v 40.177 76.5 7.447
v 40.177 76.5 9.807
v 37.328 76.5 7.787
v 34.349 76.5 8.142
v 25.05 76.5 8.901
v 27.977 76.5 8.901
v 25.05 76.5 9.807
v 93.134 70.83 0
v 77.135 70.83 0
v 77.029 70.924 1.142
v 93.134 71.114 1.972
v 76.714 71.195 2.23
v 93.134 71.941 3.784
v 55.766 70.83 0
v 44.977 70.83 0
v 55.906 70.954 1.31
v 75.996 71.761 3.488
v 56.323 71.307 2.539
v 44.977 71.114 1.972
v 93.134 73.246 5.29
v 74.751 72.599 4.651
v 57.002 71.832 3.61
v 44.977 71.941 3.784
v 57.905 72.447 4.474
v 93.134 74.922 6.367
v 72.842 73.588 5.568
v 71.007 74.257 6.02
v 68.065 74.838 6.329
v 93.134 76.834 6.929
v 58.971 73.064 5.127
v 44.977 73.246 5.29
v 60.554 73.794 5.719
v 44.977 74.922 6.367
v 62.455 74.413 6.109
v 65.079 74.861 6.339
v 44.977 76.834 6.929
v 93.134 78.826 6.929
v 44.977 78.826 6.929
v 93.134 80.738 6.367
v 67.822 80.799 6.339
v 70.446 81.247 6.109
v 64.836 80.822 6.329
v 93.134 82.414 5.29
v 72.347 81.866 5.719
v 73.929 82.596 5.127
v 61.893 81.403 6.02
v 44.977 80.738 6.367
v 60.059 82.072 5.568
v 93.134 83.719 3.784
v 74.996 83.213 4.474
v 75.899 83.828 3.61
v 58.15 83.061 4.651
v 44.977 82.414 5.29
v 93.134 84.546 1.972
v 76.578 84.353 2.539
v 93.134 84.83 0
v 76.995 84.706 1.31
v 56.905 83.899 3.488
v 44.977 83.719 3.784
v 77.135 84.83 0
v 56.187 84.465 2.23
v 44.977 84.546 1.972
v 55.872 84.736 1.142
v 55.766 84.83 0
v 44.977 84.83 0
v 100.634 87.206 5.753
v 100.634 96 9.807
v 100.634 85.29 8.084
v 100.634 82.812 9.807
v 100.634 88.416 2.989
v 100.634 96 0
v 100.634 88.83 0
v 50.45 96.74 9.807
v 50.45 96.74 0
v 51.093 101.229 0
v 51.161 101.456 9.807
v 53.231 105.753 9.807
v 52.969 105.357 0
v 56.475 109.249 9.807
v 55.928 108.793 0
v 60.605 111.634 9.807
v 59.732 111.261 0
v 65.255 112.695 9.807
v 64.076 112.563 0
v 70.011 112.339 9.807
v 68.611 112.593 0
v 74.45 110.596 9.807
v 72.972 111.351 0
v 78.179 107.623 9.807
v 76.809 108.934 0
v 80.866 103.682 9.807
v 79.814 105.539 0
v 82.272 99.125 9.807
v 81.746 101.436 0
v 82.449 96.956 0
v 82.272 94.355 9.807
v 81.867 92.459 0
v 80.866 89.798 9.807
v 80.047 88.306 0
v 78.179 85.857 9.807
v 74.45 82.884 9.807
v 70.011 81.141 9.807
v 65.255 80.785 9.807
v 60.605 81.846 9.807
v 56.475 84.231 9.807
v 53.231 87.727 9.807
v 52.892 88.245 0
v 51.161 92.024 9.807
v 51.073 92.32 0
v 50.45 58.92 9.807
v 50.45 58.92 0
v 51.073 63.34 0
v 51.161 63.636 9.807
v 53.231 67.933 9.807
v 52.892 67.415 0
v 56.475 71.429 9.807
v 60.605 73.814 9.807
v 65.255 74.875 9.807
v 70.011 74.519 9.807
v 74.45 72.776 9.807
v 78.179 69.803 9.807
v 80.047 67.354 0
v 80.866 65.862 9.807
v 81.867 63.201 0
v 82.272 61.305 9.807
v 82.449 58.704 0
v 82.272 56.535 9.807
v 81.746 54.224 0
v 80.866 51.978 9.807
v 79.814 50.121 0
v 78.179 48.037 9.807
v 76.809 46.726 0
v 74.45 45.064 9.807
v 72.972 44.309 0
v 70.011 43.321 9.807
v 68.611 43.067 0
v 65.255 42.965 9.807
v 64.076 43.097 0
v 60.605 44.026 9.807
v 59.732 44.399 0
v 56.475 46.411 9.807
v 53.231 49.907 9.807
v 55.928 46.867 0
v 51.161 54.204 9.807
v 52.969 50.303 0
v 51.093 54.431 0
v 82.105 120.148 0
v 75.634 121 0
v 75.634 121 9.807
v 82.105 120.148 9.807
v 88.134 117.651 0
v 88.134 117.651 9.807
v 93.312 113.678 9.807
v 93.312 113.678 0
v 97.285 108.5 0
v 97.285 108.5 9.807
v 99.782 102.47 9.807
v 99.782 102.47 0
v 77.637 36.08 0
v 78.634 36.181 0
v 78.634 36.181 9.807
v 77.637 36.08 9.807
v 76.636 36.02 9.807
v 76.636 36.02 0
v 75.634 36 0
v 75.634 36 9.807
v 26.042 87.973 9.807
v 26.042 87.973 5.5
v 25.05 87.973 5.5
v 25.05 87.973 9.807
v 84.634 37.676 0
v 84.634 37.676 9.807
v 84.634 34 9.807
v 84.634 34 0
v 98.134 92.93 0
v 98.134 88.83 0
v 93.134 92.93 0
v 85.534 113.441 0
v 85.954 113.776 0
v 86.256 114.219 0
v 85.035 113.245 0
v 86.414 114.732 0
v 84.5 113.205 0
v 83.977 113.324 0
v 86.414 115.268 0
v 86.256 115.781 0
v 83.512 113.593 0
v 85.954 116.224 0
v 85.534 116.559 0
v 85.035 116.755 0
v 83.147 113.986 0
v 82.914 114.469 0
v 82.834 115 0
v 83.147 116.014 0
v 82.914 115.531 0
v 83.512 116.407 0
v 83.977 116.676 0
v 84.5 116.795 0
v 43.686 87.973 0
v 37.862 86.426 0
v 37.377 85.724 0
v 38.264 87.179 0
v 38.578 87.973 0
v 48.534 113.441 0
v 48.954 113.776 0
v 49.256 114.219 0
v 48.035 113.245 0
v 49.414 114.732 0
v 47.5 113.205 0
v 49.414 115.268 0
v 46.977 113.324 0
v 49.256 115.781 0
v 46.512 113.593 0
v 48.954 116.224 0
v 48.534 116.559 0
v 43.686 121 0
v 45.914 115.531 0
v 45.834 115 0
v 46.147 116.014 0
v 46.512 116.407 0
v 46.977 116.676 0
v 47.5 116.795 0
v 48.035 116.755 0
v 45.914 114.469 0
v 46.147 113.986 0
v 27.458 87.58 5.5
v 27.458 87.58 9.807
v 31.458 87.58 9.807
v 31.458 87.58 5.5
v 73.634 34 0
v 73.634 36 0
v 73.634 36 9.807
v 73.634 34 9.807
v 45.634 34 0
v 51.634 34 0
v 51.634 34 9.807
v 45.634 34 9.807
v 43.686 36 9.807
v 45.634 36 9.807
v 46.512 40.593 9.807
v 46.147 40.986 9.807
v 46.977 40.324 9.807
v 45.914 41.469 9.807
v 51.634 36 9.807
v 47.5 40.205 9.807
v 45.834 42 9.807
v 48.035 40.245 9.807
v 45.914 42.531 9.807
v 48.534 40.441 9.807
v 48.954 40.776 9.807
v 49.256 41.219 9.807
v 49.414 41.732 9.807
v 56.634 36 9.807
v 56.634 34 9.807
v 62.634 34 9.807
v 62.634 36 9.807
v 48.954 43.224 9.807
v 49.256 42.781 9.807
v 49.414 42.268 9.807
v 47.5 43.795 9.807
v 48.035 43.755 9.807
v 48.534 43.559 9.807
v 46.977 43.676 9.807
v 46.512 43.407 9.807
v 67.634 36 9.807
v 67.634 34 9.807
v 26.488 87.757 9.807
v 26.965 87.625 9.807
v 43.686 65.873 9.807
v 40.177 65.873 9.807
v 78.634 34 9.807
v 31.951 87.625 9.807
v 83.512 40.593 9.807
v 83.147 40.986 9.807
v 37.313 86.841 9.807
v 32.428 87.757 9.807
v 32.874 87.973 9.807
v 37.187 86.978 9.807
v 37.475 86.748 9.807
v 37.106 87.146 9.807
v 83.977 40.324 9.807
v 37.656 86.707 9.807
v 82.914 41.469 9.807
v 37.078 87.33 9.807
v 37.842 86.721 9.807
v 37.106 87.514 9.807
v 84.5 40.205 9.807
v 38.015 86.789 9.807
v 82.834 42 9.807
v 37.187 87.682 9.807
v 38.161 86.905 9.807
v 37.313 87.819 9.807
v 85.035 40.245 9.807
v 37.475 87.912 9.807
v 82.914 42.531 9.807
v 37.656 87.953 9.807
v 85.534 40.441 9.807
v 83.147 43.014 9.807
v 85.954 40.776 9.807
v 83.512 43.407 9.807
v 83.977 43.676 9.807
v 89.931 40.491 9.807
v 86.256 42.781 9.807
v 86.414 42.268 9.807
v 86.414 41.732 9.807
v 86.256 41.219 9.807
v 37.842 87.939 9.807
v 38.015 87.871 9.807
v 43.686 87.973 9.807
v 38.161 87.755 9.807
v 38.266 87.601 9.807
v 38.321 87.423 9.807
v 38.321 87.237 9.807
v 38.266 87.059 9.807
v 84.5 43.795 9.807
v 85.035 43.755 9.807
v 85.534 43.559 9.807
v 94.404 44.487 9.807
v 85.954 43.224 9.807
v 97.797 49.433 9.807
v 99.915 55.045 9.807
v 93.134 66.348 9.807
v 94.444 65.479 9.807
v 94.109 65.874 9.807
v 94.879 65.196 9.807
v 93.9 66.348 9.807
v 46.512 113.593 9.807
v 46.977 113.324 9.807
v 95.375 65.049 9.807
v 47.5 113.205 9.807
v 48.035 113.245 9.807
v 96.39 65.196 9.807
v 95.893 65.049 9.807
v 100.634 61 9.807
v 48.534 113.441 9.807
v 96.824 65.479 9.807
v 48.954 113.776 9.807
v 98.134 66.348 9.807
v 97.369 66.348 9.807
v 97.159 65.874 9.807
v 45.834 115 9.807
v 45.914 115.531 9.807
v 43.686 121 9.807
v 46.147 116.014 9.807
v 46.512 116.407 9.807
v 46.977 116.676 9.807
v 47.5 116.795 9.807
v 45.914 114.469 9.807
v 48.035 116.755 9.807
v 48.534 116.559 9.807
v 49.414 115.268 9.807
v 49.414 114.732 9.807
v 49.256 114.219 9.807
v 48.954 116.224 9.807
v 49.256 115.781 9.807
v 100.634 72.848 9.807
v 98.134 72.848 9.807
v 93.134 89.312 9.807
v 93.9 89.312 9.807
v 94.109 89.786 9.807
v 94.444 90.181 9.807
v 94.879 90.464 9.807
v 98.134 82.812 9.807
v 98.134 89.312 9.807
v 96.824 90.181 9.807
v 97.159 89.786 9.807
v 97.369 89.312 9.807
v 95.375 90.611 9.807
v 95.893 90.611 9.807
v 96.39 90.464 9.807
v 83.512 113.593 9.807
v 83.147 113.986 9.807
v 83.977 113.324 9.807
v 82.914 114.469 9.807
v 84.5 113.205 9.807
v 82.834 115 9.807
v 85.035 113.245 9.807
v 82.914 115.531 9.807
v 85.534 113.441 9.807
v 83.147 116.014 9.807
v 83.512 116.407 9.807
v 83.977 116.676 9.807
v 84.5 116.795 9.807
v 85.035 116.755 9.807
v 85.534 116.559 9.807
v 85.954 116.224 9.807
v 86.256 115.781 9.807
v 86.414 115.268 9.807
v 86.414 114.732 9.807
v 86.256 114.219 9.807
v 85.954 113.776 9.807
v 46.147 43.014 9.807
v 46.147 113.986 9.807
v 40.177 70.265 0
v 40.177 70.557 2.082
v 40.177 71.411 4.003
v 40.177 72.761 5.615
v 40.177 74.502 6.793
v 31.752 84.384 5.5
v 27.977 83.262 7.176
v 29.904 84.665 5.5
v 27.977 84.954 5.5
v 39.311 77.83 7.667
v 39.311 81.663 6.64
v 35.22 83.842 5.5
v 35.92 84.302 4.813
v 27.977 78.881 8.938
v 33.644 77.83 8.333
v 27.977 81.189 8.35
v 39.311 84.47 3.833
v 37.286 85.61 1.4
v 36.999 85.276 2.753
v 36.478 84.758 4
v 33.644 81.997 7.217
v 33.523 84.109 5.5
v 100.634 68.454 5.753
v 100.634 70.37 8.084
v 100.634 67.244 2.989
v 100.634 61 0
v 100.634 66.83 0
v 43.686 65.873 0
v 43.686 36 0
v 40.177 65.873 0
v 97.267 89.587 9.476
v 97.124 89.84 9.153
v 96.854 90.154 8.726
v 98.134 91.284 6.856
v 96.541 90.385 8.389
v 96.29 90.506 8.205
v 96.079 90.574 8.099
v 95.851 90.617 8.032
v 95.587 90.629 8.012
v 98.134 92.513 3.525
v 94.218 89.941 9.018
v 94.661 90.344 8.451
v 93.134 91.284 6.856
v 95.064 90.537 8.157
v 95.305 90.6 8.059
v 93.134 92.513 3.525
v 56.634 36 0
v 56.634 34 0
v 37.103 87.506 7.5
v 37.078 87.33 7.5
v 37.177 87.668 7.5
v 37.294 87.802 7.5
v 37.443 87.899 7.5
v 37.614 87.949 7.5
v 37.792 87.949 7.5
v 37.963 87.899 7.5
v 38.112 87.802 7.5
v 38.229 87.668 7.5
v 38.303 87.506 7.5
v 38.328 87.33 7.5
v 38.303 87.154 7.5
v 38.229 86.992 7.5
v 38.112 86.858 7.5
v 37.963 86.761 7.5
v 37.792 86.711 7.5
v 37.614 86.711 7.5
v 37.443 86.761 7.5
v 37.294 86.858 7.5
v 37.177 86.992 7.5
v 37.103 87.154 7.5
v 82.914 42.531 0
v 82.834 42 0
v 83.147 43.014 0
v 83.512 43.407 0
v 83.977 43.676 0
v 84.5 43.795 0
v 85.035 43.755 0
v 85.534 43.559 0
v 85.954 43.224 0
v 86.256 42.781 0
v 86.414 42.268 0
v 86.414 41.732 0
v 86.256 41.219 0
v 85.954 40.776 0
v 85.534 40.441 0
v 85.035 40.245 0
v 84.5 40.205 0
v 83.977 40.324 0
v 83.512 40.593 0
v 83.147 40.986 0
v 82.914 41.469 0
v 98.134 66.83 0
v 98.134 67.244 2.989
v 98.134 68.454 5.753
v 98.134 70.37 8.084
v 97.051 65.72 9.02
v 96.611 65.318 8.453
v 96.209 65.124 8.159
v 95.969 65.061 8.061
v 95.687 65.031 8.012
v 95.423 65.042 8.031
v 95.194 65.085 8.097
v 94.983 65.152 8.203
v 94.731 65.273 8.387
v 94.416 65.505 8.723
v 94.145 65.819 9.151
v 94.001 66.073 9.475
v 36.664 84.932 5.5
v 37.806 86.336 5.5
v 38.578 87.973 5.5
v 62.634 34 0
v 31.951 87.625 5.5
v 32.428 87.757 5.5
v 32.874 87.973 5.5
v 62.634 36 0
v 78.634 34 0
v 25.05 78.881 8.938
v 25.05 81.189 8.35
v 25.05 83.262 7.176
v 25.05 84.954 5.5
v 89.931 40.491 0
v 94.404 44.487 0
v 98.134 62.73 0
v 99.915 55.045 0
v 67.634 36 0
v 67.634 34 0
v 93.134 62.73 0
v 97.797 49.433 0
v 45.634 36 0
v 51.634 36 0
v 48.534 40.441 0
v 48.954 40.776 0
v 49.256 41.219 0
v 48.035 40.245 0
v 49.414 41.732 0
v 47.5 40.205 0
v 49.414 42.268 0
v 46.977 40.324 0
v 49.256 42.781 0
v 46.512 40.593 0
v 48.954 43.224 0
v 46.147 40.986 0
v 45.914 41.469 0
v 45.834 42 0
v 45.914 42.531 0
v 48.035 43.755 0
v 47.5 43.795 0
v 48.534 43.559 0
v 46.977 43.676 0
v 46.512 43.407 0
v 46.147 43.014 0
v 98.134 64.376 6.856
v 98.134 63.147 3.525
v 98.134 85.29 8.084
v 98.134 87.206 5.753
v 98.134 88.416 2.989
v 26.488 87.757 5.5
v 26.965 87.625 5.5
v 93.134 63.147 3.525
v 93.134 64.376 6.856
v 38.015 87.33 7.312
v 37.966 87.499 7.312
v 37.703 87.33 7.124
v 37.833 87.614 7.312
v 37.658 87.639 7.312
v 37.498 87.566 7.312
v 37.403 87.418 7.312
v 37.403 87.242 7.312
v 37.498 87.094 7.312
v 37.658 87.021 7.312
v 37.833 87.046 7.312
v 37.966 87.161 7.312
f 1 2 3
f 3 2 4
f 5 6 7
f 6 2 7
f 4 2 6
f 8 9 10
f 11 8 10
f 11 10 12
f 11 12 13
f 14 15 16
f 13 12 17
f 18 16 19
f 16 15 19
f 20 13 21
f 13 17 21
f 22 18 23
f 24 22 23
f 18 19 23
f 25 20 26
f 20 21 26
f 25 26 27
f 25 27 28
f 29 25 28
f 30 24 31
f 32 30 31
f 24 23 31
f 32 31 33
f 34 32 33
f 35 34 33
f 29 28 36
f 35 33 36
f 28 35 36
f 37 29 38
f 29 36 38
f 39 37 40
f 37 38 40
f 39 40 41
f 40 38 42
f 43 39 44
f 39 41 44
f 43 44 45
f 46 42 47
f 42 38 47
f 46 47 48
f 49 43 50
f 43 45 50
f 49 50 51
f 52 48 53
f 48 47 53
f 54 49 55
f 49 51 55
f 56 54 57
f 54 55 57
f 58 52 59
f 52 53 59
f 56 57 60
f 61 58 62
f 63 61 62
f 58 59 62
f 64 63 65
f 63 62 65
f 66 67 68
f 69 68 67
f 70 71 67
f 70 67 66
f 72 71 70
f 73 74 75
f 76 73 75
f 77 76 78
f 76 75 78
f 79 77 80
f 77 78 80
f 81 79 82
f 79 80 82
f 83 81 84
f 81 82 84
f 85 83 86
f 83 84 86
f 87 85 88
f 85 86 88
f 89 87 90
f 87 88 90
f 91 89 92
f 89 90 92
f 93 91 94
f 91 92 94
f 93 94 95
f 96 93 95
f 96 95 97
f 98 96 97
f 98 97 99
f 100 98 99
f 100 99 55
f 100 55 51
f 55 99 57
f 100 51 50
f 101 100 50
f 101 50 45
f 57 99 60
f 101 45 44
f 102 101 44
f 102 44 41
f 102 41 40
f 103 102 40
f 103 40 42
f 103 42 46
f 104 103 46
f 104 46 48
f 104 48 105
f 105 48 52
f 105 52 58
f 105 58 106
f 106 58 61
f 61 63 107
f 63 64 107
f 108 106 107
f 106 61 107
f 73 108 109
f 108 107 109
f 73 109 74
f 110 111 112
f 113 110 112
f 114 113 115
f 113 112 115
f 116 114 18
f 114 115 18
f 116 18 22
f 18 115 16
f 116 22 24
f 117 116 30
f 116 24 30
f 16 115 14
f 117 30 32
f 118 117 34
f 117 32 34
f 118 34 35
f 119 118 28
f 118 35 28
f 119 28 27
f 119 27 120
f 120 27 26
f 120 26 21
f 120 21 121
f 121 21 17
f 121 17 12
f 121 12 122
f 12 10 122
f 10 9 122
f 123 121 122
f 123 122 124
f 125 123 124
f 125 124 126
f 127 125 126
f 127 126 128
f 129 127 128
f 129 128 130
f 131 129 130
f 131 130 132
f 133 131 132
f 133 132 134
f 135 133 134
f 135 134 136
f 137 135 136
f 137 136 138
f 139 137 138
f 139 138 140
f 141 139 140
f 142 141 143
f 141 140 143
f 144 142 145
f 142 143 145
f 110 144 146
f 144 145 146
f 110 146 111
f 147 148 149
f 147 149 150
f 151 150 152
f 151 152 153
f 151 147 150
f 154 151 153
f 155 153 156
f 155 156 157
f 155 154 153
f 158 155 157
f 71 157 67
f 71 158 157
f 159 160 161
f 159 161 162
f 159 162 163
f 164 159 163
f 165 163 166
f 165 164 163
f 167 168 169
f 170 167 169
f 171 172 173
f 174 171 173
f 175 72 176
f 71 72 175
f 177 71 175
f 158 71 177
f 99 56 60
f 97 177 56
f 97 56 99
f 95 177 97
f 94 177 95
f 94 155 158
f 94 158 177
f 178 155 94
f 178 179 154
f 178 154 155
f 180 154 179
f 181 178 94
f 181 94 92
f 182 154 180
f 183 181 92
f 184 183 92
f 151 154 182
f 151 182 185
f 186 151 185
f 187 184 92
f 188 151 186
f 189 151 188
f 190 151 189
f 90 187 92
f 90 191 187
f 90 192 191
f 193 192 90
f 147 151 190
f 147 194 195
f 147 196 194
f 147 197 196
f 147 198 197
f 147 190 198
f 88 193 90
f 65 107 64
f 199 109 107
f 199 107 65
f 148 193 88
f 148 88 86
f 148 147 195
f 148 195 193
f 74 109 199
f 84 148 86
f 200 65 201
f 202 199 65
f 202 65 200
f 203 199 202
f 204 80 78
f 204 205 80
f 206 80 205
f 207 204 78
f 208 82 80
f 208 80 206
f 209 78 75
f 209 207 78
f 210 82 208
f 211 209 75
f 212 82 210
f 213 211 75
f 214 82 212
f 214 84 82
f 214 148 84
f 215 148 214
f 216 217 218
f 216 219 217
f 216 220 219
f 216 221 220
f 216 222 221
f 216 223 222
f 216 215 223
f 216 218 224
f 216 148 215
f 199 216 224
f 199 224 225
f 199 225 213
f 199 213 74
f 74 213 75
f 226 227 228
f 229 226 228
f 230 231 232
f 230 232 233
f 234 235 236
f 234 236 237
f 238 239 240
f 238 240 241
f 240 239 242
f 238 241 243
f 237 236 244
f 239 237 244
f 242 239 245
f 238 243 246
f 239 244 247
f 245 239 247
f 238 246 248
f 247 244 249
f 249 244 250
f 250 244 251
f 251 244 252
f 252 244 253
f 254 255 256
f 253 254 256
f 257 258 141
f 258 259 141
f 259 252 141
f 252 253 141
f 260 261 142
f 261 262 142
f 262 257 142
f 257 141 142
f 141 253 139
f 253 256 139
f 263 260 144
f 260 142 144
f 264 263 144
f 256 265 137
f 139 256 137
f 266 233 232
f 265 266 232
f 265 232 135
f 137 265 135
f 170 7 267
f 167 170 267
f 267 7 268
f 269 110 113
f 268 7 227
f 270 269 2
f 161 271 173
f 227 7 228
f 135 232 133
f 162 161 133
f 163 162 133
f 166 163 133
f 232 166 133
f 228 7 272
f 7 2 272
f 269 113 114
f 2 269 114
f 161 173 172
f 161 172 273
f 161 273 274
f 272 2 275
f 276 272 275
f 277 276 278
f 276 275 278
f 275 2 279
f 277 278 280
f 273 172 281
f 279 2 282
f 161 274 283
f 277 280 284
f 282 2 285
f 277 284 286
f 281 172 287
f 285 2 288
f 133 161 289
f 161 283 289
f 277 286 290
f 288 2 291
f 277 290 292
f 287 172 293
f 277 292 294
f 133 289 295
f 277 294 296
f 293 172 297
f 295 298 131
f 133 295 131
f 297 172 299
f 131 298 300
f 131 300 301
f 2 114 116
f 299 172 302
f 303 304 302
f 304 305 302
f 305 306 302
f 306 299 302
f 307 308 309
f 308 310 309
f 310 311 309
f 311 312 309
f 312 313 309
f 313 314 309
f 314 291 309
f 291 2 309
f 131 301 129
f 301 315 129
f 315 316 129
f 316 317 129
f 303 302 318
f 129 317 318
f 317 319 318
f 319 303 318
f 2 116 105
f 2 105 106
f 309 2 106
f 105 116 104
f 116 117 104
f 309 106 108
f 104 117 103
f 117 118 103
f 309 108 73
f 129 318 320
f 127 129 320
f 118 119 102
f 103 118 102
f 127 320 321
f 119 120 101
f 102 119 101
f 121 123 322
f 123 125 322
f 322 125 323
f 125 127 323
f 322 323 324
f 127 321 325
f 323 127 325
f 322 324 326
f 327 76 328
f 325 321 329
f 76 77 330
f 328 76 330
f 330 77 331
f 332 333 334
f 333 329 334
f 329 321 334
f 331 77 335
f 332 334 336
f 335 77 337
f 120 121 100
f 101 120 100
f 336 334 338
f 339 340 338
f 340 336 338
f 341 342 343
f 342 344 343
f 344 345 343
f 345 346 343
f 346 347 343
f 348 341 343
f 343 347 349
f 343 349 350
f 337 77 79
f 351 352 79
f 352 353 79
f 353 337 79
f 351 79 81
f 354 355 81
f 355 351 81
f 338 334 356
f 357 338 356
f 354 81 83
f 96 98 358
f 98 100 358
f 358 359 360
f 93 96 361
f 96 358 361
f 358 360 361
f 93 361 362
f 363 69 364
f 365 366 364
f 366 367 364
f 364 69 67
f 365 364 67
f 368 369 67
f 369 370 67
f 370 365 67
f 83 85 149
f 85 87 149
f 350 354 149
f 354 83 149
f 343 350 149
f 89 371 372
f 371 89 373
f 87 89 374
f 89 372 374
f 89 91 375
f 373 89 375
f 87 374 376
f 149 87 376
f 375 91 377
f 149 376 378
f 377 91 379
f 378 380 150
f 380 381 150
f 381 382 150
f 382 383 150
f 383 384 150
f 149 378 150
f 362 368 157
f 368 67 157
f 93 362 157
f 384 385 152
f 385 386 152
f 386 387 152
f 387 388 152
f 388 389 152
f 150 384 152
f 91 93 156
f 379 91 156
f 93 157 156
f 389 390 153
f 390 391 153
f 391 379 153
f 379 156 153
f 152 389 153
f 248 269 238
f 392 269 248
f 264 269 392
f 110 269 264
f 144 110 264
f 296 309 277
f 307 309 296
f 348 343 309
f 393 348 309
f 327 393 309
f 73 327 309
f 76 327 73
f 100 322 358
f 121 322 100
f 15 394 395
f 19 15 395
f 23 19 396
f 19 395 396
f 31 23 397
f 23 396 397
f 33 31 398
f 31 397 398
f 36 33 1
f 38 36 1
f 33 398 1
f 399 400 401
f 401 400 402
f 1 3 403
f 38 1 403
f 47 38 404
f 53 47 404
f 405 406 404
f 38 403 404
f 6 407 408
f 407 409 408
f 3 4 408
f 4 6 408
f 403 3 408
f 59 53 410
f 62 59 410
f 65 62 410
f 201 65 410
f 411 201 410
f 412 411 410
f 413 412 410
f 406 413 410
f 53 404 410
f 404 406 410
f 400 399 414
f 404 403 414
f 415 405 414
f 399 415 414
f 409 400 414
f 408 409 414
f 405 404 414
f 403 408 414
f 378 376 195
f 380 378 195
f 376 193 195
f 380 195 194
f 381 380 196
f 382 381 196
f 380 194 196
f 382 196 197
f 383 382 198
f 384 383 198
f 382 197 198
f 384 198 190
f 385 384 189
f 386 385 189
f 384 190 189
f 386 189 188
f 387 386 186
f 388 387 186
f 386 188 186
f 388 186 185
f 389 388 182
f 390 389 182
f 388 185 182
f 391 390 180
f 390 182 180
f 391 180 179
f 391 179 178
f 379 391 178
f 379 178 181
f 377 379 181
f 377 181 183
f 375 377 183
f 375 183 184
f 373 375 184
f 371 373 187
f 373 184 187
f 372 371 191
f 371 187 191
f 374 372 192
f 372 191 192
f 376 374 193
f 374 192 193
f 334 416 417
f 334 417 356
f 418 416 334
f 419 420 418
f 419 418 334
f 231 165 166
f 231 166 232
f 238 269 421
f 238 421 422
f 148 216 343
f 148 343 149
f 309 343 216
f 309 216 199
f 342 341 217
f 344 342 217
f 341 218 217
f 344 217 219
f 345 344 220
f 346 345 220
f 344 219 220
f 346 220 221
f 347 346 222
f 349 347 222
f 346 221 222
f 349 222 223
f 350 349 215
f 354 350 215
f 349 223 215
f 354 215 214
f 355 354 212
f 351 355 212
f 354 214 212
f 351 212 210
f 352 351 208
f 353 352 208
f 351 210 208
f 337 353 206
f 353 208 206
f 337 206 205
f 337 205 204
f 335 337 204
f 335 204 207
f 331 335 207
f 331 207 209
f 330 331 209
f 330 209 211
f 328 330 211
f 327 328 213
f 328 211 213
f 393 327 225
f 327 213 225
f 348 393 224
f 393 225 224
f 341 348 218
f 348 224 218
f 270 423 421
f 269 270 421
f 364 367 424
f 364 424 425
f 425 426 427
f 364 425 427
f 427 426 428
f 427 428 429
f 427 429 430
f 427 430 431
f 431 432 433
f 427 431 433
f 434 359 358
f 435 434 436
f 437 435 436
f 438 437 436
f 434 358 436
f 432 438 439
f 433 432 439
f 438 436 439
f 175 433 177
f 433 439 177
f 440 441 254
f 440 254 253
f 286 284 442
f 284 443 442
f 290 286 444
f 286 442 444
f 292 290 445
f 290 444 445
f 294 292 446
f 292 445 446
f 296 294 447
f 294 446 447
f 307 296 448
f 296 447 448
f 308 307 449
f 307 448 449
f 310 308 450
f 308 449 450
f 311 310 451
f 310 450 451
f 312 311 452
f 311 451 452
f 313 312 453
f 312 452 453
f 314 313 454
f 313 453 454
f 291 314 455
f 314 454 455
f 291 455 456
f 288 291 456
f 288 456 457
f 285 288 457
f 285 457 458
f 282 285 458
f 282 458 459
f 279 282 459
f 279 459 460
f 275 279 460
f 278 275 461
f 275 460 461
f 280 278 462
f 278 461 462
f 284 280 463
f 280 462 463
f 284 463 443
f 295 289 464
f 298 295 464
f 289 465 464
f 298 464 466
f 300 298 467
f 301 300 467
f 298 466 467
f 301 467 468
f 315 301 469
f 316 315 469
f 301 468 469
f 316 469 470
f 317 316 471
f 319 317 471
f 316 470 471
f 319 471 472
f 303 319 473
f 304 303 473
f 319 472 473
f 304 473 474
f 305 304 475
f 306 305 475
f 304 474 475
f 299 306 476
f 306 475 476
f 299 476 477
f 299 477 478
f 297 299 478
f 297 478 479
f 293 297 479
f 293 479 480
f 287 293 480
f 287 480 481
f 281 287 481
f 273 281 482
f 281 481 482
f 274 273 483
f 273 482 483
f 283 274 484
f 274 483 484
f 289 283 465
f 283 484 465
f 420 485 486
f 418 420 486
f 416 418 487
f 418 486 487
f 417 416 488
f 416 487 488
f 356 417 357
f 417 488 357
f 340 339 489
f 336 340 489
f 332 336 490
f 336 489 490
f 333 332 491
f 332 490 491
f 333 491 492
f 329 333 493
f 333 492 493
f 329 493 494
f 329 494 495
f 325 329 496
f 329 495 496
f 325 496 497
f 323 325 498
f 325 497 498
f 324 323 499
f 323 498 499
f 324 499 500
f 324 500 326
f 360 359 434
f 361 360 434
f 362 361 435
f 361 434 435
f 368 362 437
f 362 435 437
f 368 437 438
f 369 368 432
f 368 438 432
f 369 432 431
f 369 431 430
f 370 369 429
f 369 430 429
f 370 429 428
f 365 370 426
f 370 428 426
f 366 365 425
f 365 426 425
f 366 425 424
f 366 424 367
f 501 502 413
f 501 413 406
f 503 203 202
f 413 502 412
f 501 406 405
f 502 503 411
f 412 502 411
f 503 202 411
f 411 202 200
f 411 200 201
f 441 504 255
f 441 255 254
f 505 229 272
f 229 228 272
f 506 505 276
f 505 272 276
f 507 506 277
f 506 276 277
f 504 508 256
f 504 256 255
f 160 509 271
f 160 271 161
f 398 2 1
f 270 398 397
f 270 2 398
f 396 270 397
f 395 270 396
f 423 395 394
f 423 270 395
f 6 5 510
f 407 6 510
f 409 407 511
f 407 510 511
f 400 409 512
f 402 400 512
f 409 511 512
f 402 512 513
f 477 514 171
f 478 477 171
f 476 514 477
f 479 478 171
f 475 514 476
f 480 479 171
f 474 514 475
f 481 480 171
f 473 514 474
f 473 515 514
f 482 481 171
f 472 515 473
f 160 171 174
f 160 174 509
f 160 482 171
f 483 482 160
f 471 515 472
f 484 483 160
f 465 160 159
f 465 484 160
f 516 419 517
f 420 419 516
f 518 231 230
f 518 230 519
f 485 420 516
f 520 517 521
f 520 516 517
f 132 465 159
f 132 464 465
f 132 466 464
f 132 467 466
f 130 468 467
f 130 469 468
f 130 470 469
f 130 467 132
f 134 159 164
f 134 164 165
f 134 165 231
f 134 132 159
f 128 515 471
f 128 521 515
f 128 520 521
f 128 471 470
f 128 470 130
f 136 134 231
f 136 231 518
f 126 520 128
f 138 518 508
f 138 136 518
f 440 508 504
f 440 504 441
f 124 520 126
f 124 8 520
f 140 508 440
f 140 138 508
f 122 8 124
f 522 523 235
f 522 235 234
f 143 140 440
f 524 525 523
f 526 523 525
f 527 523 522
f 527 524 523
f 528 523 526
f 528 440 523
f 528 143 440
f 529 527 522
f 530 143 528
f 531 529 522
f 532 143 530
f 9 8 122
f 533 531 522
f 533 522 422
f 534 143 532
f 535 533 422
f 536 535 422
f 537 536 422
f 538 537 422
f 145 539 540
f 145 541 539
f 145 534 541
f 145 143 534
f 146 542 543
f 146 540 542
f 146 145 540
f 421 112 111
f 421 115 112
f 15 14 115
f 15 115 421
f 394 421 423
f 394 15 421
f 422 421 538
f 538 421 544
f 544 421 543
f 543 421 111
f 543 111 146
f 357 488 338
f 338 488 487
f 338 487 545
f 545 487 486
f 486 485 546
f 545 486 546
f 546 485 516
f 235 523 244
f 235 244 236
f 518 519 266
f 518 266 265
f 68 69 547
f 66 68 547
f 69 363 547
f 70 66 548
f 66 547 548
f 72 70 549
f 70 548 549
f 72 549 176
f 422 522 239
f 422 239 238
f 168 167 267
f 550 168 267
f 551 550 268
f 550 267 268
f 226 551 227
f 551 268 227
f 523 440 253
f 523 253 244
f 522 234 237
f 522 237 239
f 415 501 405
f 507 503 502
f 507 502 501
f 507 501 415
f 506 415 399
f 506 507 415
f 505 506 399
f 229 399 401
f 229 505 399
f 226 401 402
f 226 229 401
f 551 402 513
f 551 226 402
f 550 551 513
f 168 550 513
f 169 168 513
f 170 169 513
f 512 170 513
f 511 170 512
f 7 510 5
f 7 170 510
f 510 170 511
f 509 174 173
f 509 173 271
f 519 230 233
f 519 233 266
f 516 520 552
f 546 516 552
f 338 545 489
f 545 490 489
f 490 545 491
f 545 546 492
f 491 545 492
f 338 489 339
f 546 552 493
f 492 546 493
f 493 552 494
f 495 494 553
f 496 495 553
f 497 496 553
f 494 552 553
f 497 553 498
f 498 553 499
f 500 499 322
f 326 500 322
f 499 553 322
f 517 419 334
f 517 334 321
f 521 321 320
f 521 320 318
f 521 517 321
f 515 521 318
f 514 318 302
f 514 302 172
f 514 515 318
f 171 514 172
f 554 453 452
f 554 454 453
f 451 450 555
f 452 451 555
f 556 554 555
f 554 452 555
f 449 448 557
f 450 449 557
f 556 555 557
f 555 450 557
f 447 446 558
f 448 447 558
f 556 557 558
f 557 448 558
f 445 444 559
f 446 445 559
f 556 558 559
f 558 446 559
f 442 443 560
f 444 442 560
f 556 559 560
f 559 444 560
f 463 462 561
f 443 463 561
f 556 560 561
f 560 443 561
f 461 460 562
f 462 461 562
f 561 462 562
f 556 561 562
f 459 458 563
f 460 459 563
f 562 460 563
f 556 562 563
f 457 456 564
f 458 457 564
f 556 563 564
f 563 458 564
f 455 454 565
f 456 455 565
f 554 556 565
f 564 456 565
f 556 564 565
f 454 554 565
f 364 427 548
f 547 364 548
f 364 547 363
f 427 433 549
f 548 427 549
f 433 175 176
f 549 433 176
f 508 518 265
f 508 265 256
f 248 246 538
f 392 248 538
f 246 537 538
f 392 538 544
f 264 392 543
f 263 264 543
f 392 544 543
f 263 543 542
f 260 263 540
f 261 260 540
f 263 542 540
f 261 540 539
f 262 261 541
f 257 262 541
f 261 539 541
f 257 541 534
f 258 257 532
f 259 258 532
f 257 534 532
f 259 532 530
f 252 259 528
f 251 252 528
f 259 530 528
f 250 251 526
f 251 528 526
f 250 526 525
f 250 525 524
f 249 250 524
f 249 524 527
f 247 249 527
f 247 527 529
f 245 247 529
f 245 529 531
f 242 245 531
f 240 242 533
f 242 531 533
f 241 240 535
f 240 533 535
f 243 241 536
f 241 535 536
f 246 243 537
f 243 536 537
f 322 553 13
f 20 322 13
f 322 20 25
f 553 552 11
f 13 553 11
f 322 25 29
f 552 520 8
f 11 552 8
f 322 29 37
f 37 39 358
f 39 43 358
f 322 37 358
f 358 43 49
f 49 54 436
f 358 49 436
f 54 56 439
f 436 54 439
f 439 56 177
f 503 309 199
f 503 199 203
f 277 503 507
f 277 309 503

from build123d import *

# Parameters (mm, degrees)
MAIN_BODY_DEPTH                                      = 16
FLYWHEEL_ESC_CLEARANCE_DEPTH                         = 10
FLYWHEEL_ESC_WIRE_DEPTH                              = 5
DRIVE_STEPPER_CLEARANCE_DEPTH                        = 13
DRIVE_BELT_CLEARANCE_DEPTH                           = 4
CLIP_CLEARANCE_DEPTH                                 = 40.5
CLIP_HEAD_CLEARANCE_DEPTH                            = 13
SKETCH16_R                                           = 16
FLYWHEEL_CLEARANCE_DEPTH                             = 10
SKETCH17_W                                           = 12
SKETCH17_H                                           = 10
CUT_EXTRUDE17_DEPTH                                  = 83
M3_TAPPED_HOLE1_D                                    = 2.5
M3_TAPPED_HOLE1_DEPTH                                = 7.5
M3_TAPPED_HOLE1_TIP                                  = 0.751075774
CBORE_FOR_M3_HEX_SOCKET_THIN_HEAD_CAP_SC_D           = 3.6
CBORE_FOR_M3_HEX_SOCKET_THIN_HEAD_CAP_SC_CBORE_D     = 6.5
CBORE_FOR_M3_HEX_SOCKET_THIN_HEAD_CAP_SC_CBORE_DEPTH = 3
FILLET1_R                                            = 7
CUT_EXTRUDE19_DEPTH                                  = 3.5
M1_6_TAPPED_HOLE1_D                                  = 1.25
M1_6_TAPPED_HOLE1_DEPTH                              = 5
M1_6_TAPPED_HOLE1_TIP                                = 0.375537887
CUT_EXTRUDE20_REACH                                  = 159.875
VARFILLET1_R                                         = 1
CUT_EXTRUDE21_DEPTH                                  = 1.5
SKETCH29_W                                           = 51.659518048
SKETCH29_H                                           = 2.245304486
BOSS_EXTRUDE1_DEPTH                                  = 1
CUT_EXTRUDE22_START                                  = -16
CUT_EXTRUDE22_DEPTH                                  = 16
CUT_EXTRUDE23_START                                  = -75.58451
SKETCH32_W                                           = 7.763871227
SKETCH32_H                                           = 95.016791683
CUT_EXTRUDE23_DEPTH                                  = 75.58451


with BuildPart() as part:
    # Sketch1 → main body (new body)
    with BuildSketch(Plane.XY):
        with BuildLine():
            Line((84.634238464, 37.676192421), (84.634238464, 34))
            Line((84.634238464, 34), (78.634238464, 34))
            Line((78.634238464, 34), (78.634238464, 36.180652708))
            ThreePointArc((78.634238464, 36.180652708), (77.13695562, 36.045204045), (75.634238464, 36))
            Line((75.634238464, 36), (73.634238464, 36))
            Line((73.634238464, 36), (73.634238464, 34))
            Line((73.634238464, 34), (67.634238464, 34))
            Line((67.634238464, 34), (67.634238464, 36))
            Line((67.634238464, 36), (62.634238464, 36))
            Line((62.634238464, 36), (62.634238464, 34))
            Line((62.634238464, 34), (56.634238464, 34))
            Line((56.634238464, 34), (56.634238464, 36))
            Line((56.634238464, 36), (51.634238464, 36))
            Line((51.634238464, 36), (51.634238464, 34))
            Line((51.634238464, 34), (45.634238464, 34))
            Line((45.634238464, 34), (45.634238464, 36))
            Line((45.634238464, 36), (40.177209114, 36))
            Line((40.177209114, 36), (-54.822790886, 36))
            Line((-54.822790886, 36), (-54.822790886, 119))
            Line((-54.822790886, 119), (-42.822790886, 119))
            Line((-42.822790886, 119), (-42.822790886, 121))
            Line((-42.822790886, 121), (75.634238464, 121))
            ThreePointArc((75.634238464, 121), (93.311907994, 113.67766953), (100.634238464, 96))
            Line((100.634238464, 96), (100.634238464, 61))
            ThreePointArc((100.634238464, 61), (96.249766592, 46.857864376), (84.634238464, 37.676192421))
        make_face()
    extrude(amount=MAIN_BODY_DEPTH)

    # Sketch2 → flywheel_esc_clearance (cut)
    with BuildSketch(Plane(origin=(0, 0, 0), x_dir=(-1, 0, 0), z_dir=(0, 0, -1))):
        Polygon((-7.21561795, 116.504695514), (-10.21561795, 116.504695514), (-10.21561795, 118.754695514), (-13.21561795, 118.754695514), (-10.970313465, 121), (-12.384527027, 121), (-14.629831513, 118.754695514), (-18.21561795, 118.754695514), (-15.970313465, 121), (-17.384527027, 121), (-19.629831513, 118.754695514), (-23.21561795, 118.754695514), (-20.970313465, 121), (-22.384527027, 121), (-24.629831513, 118.754695514), (-28.21561795, 118.754695514), (-25.970313465, 121), (-27.384527027, 121), (-29.629831513, 118.754695514), (-33.21561795, 118.754695514), (-30.970313465, 121), (-32.384527027, 121), (-34.629831513, 118.754695514), (-35.21561795, 118.754695514), (-35.21561795, 116.504695514), (-37.71561795, 116.504695514), (-37.71561795, 114.004695514), (-35.21561795, 114.004695514), (-35.21561795, 111.754695514), (-14.71561795, 111.754695514), (-14.71561795, 109.254695514), (-10.21561795, 109.254695514), (-10.21561795, 111.047588733), (-10.21561795, 114.004695514), (-7.21561795, 114.004695514), (-7.21561795, 111.047588733), (-7.21561795, 109.254695514), (-2.71561795, 109.254695514), (-2.71561795, 111.754695514), (17.78438205, 111.754695514), (17.78438205, 114.004695514), (20.28438205, 114.004695514), (20.28438205, 116.504695514), (17.78438205, 116.504695514), (17.78438205, 118.754695514), (14.78438205, 118.754695514), (17.029686535, 121), (15.615472973, 121), (13.370168487, 118.754695514), (9.78438205, 118.754695514), (12.029686535, 121), (10.615472973, 121), (8.370168487, 118.754695514), (4.78438205, 118.754695514), (7.029686535, 121), (5.615472973, 121), (3.370168487, 118.754695514), (-0.21561795, 118.754695514), (2.029686535, 121), (0.615472973, 121), (-1.629831513, 118.754695514), (-5.21561795, 118.754695514), (-2.970313465, 121), (-4.384527027, 121), (-6.629831513, 118.754695514), (-7.21561795, 118.754695514), align=None)
    extrude(amount=-FLYWHEEL_ESC_CLEARANCE_DEPTH, mode=Mode.SUBTRACT)

    # Sketch4 → Flywheel_esc_wire (cut)
    with BuildSketch(Plane(origin=(0, 0, 0), x_dir=(-1, 0, 0), z_dir=(0, 0, -1))):
        Polygon((27.259258709, 111.754695514), (42.822790886, 111.754695514), (42.822790886, 117.754695514), (17.78438205, 117.754695514), (17.78438205, 111.754695514), (-35.21561795, 111.754695514), (-35.21561795, 118.754695514), (-38.21561795, 118.754695514), (-38.21561795, 108.754695514), (27.259258709, 108.754695514), align=None)
    extrude(amount=-FLYWHEEL_ESC_WIRE_DEPTH, mode=Mode.SUBTRACT)

    # Sketch6 → drive_Stepper_clearance (cut)
    with BuildSketch(Plane(origin=(0, 0, 0), x_dir=(-1, 0, 0), z_dir=(0, 0, -1))):
        with BuildLine():
            Line((41.822790886, 108.33001947), (54.822790886, 108.33001947))
            Line((54.822790886, 108.33001947), (54.822790886, 72.33001947))
            Line((54.822790886, 72.33001947), (41.822790886, 72.33001947))
            ThreePointArc((41.822790886, 72.33001947), (39.701470543, 73.208699126), (38.822790886, 75.33001947))
            Line((38.822790886, 75.33001947), (38.822790886, 105.33001947))
            ThreePointArc((38.822790886, 105.33001947), (39.701470543, 107.451339814), (41.822790886, 108.33001947))
        make_face()
    extrude(amount=-DRIVE_STEPPER_CLEARANCE_DEPTH, mode=Mode.SUBTRACT)

    # Sketch7 → drive_belt_clearance (cut)
    with BuildSketch(Plane(origin=(0, 0, 0), x_dir=(-1, 0, 0), z_dir=(0, 0, -1))):
        with BuildLine():
            Line((-31.457904234, 82.83), (38.822790886, 82.83))
            Line((38.822790886, 82.83), (38.822790886, 97.83))
            Line((38.822790886, 97.83), (-31.457904234, 97.83))
            ThreePointArc((-31.457904234, 97.83), (-38.957904234, 90.33), (-31.457904234, 82.83))
        make_face()
    extrude(amount=-DRIVE_BELT_CLEARANCE_DEPTH, mode=Mode.SUBTRACT)

    # Sketch12 → barrel (revolve, cut)
    with BuildSketch(Plane(origin=(0, 0, 0), x_dir=(-1, 0, 0), z_dir=(0, 0, -1))):
        Polygon((-100.634238464, 88.83), (-98.134238464, 88.83), (-98.134238464, 92.93), (-93.134238464, 92.93), (-93.134238464, 84.83), (-44.977209114, 84.83), (-27.977209114, 86.83), (38.822790886, 86.83), (38.822790886, 77.83), (-93.134238464, 77.83), (-100.634238464, 77.83), align=None)
    revolve(axis=Axis((100.634238464, 77.83, 0), (-1, 0, 0)), mode=Mode.SUBTRACT)

    # Sketch14 → clip clearance (cut)
    with BuildSketch(Plane.XZ.offset(-36)):
        Polygon((40.177209114, 9.807012356), (40.177209114, 0), (-41.822790886, 0), (-41.822790886, 9.807012356), (-31.822790886, 11.340345689), (-31.822790886, 10.733333333), (-30.222790886, 10.978666667), (-30.222790886, 11.585679022), (-28.820032834, 11.80076859), (-28.820032834, 9.5), (-24.320032834, 9.5), (-24.320032834, 14), (-13.422790886, 14), (-13.422790886, 13), (-11.822790886, 13), (-11.822790886, 14), (10.177209114, 14), (10.177209114, 13), (11.777209114, 13), (11.777209114, 14), (25.177209114, 14), (25.177209114, 12.107012356), (28.577209114, 11.585679022), (28.577209114, 10.978666667), (30.177209114, 10.733333333), (30.177209114, 11.340345689), align=None)
    extrude(amount=-CLIP_CLEARANCE_DEPTH, mode=Mode.SUBTRACT)

    # Sketch15 → clip-head clearance (cut)
    with BuildSketch(Plane.XZ.offset(-76.5)):
        Polygon((-24.320032834, 0), (-24.320032834, 14), (-13.422790886, 14), (-13.422790886, 13), (-11.822790886, 13), (-11.822790886, 14), (10.177209114, 14), (10.177209114, 13), (11.777209114, 13), (11.777209114, 14), (22.464967166, 14), (22.464967166, 0), align=None)
    extrude(amount=-CLIP_HEAD_CLEARANCE_DEPTH, mode=Mode.SUBTRACT)

    # Sketch16 → flywheel_clearance (cut)
    with BuildSketch(Plane(origin=(0, 0, 0), x_dir=(-1, 0, 0), z_dir=(0, 0, -1))):
        with Locations((-66.450434282, 96.74)):
            Circle(SKETCH16_R)
        with Locations((-66.450434282, 58.92)):
            Circle(SKETCH16_R)
    extrude(amount=-FLYWHEEL_CLEARANCE_DEPTH, mode=Mode.SUBTRACT)

    # Sketch17 → Cut-Extrude17 (cut)
    with BuildSketch(Plane(origin=(0, 119, 0), x_dir=(1, 0, 0), z_dir=(0, 1, 0))):
        with Locations((-48.822790886, -5)):
            Rectangle(SKETCH17_W, SKETCH17_H)
    extrude(amount=-CUT_EXTRUDE17_DEPTH, mode=Mode.SUBTRACT)

    # M3 Tapped Hole1
    with Locations(Plane(origin=(0, 36, 0), x_dir=(-1, 0, 0), z_dir=(0, -1, 0))):
        with Locations((44.822790886, -12.5), (-41.677209114, -12.5)):
            Hole(M3_TAPPED_HOLE1_D / 2, depth=M3_TAPPED_HOLE1_DEPTH)
            with Locations((0, 0, -(M3_TAPPED_HOLE1_DEPTH + M3_TAPPED_HOLE1_TIP / 2))):  # 118° drill point
                Cone(0, M3_TAPPED_HOLE1_D / 2, M3_TAPPED_HOLE1_TIP, mode=Mode.SUBTRACT)

    # CBORE for M3 Hex Socket Thin Head Cap Screw1 (through all)
    with Locations(Plane.XY.offset(16)):
        with Locations((95.634238464, 88.83), (95.634238464, 66.83), (84.634238464, 115), (47.634238464, 115), (47.634238464, 42), (84.634238464, 42), (-48.822790886, 44.50734437), (-48.822790886, 64.952229105), (-48.822790886, 115)):
            CounterBoreHole(CBORE_FOR_M3_HEX_SOCKET_THIN_HEAD_CAP_SC_D / 2, CBORE_FOR_M3_HEX_SOCKET_THIN_HEAD_CAP_SC_CBORE_D / 2, CBORE_FOR_M3_HEX_SOCKET_THIN_HEAD_CAP_SC_CBORE_DEPTH)

    # Fillet1
    fillet1_edges = [part.edges().sort_by_distance(p)[0] for p in [
        (-0.822790886, 89.5, 14),
    ]]
    fillet(fillet1_edges, radius=FILLET1_R)

    # Sketch23 → Cut-Extrude19 (cut)
    with BuildSketch(Plane.XY.offset(16)):
        with BuildLine():
            Line((16.157904234, 96.58), (31.457904234, 96.58))
            ThreePointArc((31.457904234, 96.58), (35.564181233, 95.041792569), (37.649240377, 91.184316547))
            ThreePointArc((37.649240377, 91.184316547), (37.882767002, 90.752279232), (38.342670026, 90.58))
            Line((38.342670026, 90.58), (43.040307117, 90.58))
            ThreePointArc((43.040307117, 90.58), (43.535281864, 90.374974747), (43.740307117, 89.88))
            Line((43.740307117, 89.88), (43.740307117, 84.78))
            ThreePointArc((43.740307117, 84.78), (43.535281864, 84.285025253), (43.040307117, 84.08))
            Line((43.040307117, 84.08), (27.457904234, 84.08))
            ThreePointArc((27.457904234, 84.08), (23.351627235, 85.618207431), (21.266568091, 89.475683453))
            ThreePointArc((21.266568091, 89.475683453), (21.033041467, 89.907720768), (20.573138443, 90.08))
            Line((20.573138443, 90.08), (16.157904234, 90.08))
            ThreePointArc((16.157904234, 90.08), (15.662929487, 90.285025253), (15.457904234, 90.78))
            Line((15.457904234, 90.78), (15.457904234, 95.88))
            ThreePointArc((15.457904234, 95.88), (15.662929487, 96.374974747), (16.157904234, 96.58))
        make_face()
    extrude(amount=-CUT_EXTRUDE19_DEPTH, mode=Mode.SUBTRACT)

    # M1.6 Tapped Hole1
    with Locations(Plane.XY.offset(12.5)):
        with Locations((21.212906236, 93.33), (37.702902233, 87.33)):
            Hole(M1_6_TAPPED_HOLE1_D / 2, depth=M1_6_TAPPED_HOLE1_DEPTH)
            with Locations((0, 0, -(M1_6_TAPPED_HOLE1_DEPTH + M1_6_TAPPED_HOLE1_TIP / 2))):  # 118° drill point
                Cone(0, M1_6_TAPPED_HOLE1_D / 2, M1_6_TAPPED_HOLE1_TIP, mode=Mode.SUBTRACT)

    # Sketch27 → Cut-Extrude20 (cut, up to next)
    with BuildSketch(Plane.XY.offset(12.5), mode=Mode.PRIVATE) as cut_extrude20_sk1:
        with BuildLine():
            Line((27.457904234, 87.58), (31.457904234, 87.58))
            ThreePointArc((31.457904234, 87.58), (34.207904234, 90.33), (31.457904234, 93.08))
            Line((31.457904234, 93.08), (27.457904234, 93.08))
            ThreePointArc((27.457904234, 93.08), (24.707904234, 90.33), (27.457904234, 87.58))
        make_face()
    cut_extrude20_tool1 = extrude(cut_extrude20_sk1.sketch, amount=-CUT_EXTRUDE20_REACH, mode=Mode.PRIVATE) & part.part
    add(cut_extrude20_tool1.solids().sort_by_distance((29.457904, 90.33, 12.5))[0], mode=Mode.SUBTRACT)

    # VarFillet1
    varfillet1_edges = [part.edges().sort_by_distance(p)[0] for p in [
        (24.707904234, 90.33, 12.5),
    ]]
    fillet(varfillet1_edges, radius=VARFILLET1_R)

    # Sketch28 → Cut-Extrude21 (cut)
    with BuildSketch(Plane(origin=(0, 0, 4), x_dir=(-1, 0, 0), z_dir=(0, 0, -1))):
        with BuildLine():
            Line((-27.457904234, 97.83), (-31.457904234, 97.83))
            ThreePointArc((-31.457904234, 97.83), (-38.957904234, 90.33), (-31.457904234, 82.83))
            Line((-31.457904234, 82.83), (-27.457904234, 82.83))
            ThreePointArc((-27.457904234, 82.83), (-19.957904234, 90.33), (-27.457904234, 97.83))
        make_face()
    extrude(amount=-CUT_EXTRUDE21_DEPTH, mode=Mode.SUBTRACT)

    # Sketch29 → Boss-Extrude1 (add)
    with BuildSketch(Plane(origin=(0, 0, 0), x_dir=(-1, 0, 0), z_dir=(0, 0, -1))):
        with Locations((-8.800072489, 119.877347757)):
            Rectangle(SKETCH29_W, SKETCH29_H)
    extrude(amount=-BOSS_EXTRUDE1_DEPTH)

    # Sketch30 → Cut-Extrude22 (cut)
    with BuildSketch(Plane(origin=(0, 0, 0), x_dir=(-1, 0, 0), z_dir=(0, 0, -1)).offset(CUT_EXTRUDE22_START)):
        Polygon((54.822790886, 99.517275915), (55.927668627, 99.517275915), (55.927668627, 124.750558425), (-43.686074091, 124.750558425), (-43.686074091, 99.517275915), (-43.686074091, 87.972636859), (-25.049728185, 87.972636859), (-25.049728185, 65.872899236), (-43.686074091, 65.872899236), (-43.686074091, 36), (-25.049728185, 36), (54.822790886, 36), align=None)
    extrude(amount=CUT_EXTRUDE22_DEPTH, mode=Mode.SUBTRACT)

    # Sketch32 → Cut-Extrude23 (cut)
    with BuildSketch(Plane.ZY.offset(-25.049728185).offset(CUT_EXTRUDE23_START)):
        with Locations((13.68894797, 76.395665261)):
            Rectangle(SKETCH32_W, SKETCH32_H)
    extrude(amount=CUT_EXTRUDE23_DEPTH, mode=Mode.SUBTRACT)


solid = part.part
